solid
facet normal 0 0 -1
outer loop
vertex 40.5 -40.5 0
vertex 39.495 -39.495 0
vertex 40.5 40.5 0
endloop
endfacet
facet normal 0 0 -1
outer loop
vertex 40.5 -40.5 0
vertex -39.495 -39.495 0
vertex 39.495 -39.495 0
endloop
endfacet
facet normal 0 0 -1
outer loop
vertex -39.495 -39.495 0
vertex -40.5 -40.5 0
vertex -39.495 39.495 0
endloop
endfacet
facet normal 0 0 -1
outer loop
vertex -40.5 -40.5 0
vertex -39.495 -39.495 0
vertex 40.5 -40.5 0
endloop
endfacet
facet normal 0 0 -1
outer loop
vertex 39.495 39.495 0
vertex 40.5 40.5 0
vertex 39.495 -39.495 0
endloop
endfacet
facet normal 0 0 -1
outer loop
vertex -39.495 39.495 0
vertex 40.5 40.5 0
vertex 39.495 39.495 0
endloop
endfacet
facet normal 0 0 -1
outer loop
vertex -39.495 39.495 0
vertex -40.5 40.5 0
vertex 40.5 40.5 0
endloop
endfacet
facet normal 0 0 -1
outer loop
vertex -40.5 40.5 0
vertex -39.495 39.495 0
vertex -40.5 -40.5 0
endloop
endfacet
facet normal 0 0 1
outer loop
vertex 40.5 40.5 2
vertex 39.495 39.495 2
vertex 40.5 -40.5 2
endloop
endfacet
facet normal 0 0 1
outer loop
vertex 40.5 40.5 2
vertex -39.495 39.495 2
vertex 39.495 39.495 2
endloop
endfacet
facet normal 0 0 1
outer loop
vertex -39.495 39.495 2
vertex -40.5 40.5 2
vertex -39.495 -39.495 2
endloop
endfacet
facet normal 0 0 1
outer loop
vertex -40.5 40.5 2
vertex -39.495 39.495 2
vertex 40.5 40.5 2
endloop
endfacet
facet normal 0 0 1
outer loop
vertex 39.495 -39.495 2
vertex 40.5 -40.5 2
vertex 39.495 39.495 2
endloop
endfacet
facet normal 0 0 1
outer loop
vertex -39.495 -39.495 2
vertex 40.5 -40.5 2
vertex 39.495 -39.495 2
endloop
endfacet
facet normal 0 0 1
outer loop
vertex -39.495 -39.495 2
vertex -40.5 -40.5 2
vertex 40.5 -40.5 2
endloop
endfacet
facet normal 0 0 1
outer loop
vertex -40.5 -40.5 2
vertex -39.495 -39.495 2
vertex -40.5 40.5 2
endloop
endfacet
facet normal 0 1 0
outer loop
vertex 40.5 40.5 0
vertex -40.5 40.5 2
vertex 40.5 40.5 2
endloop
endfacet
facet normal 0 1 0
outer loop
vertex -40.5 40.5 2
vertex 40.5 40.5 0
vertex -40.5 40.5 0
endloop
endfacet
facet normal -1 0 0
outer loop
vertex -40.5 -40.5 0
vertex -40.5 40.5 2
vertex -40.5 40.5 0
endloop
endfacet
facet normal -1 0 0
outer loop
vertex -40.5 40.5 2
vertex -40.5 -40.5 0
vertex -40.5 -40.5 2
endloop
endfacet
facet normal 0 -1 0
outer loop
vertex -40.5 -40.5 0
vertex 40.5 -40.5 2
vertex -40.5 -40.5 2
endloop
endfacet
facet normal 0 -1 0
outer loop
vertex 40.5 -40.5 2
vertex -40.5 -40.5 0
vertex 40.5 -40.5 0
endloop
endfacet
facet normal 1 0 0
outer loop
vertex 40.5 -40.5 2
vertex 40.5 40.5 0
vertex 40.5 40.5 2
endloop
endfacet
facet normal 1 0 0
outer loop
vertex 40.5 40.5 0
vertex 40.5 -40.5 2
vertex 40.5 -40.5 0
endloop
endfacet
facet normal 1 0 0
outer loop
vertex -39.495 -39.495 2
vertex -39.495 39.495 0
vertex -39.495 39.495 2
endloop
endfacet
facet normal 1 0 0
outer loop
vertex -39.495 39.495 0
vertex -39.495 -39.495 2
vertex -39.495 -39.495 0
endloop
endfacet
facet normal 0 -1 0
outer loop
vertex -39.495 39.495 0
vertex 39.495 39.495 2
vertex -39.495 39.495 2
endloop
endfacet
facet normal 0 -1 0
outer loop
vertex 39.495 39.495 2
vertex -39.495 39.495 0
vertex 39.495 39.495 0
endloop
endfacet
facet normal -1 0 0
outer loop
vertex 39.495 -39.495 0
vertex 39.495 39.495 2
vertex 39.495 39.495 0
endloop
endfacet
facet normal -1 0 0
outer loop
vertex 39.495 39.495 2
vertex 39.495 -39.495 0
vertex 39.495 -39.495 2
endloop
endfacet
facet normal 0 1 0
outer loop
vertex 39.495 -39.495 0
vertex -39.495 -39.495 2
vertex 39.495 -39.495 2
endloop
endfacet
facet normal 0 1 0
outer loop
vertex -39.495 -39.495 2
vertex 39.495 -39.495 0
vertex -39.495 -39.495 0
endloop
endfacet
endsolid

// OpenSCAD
/* 
 * Based on Customizable Lithopane http://www.thingiverse.com/thing:78719
 * 
 * Switched to customizer's higher resolution image input (150 x 150 pixels)
 * Fully parametrized dimensions of lithopane based on thickness and size
 *
 */

// preview[view:south, tilt:top]

/* [Image] */

// Load a square image, simple photos work best. Will be scaled to 150x150 pixels. Make sure to click the Invert Colors checkbox!
image_file = "image5.dat"; // [image_surface:150x150]

/* [Adjustments] */

// Overall thickness/height of lithophane
height = 2;
// Overall length/width of lithophane in mm
size = 81;

//Layer you will be slicing at
layer_height = 0.01;

//Minimum height for bottom layer in mm (recommended at least 0.2)
bottom_padding = 0.4;

// lithophane border in mm
lithophane_border = 2;

/* [Hidden] */
resolution=150;
s=0.01;

difference(){
 union() {
  difference() {
    translate([0, 0, bottom_padding]) scale([(size-lithophane_border+1)/resolution,(size-lithophane_border+1)/resolution,height-bottom_padding]) surface(file=image_file, center=true, convexity=5);

  } // d
 
  linear_extrude(height=height){
    difference(){
      square([size, size], center=true);
      square([size-lithophane_border-s, size-lithophane_border-s], center=true);
    } // d
  } // le
} // u

translate([0,0,-(height)]) linear_extrude(height=height) square([size+s, size+s], center=true);

} //d
